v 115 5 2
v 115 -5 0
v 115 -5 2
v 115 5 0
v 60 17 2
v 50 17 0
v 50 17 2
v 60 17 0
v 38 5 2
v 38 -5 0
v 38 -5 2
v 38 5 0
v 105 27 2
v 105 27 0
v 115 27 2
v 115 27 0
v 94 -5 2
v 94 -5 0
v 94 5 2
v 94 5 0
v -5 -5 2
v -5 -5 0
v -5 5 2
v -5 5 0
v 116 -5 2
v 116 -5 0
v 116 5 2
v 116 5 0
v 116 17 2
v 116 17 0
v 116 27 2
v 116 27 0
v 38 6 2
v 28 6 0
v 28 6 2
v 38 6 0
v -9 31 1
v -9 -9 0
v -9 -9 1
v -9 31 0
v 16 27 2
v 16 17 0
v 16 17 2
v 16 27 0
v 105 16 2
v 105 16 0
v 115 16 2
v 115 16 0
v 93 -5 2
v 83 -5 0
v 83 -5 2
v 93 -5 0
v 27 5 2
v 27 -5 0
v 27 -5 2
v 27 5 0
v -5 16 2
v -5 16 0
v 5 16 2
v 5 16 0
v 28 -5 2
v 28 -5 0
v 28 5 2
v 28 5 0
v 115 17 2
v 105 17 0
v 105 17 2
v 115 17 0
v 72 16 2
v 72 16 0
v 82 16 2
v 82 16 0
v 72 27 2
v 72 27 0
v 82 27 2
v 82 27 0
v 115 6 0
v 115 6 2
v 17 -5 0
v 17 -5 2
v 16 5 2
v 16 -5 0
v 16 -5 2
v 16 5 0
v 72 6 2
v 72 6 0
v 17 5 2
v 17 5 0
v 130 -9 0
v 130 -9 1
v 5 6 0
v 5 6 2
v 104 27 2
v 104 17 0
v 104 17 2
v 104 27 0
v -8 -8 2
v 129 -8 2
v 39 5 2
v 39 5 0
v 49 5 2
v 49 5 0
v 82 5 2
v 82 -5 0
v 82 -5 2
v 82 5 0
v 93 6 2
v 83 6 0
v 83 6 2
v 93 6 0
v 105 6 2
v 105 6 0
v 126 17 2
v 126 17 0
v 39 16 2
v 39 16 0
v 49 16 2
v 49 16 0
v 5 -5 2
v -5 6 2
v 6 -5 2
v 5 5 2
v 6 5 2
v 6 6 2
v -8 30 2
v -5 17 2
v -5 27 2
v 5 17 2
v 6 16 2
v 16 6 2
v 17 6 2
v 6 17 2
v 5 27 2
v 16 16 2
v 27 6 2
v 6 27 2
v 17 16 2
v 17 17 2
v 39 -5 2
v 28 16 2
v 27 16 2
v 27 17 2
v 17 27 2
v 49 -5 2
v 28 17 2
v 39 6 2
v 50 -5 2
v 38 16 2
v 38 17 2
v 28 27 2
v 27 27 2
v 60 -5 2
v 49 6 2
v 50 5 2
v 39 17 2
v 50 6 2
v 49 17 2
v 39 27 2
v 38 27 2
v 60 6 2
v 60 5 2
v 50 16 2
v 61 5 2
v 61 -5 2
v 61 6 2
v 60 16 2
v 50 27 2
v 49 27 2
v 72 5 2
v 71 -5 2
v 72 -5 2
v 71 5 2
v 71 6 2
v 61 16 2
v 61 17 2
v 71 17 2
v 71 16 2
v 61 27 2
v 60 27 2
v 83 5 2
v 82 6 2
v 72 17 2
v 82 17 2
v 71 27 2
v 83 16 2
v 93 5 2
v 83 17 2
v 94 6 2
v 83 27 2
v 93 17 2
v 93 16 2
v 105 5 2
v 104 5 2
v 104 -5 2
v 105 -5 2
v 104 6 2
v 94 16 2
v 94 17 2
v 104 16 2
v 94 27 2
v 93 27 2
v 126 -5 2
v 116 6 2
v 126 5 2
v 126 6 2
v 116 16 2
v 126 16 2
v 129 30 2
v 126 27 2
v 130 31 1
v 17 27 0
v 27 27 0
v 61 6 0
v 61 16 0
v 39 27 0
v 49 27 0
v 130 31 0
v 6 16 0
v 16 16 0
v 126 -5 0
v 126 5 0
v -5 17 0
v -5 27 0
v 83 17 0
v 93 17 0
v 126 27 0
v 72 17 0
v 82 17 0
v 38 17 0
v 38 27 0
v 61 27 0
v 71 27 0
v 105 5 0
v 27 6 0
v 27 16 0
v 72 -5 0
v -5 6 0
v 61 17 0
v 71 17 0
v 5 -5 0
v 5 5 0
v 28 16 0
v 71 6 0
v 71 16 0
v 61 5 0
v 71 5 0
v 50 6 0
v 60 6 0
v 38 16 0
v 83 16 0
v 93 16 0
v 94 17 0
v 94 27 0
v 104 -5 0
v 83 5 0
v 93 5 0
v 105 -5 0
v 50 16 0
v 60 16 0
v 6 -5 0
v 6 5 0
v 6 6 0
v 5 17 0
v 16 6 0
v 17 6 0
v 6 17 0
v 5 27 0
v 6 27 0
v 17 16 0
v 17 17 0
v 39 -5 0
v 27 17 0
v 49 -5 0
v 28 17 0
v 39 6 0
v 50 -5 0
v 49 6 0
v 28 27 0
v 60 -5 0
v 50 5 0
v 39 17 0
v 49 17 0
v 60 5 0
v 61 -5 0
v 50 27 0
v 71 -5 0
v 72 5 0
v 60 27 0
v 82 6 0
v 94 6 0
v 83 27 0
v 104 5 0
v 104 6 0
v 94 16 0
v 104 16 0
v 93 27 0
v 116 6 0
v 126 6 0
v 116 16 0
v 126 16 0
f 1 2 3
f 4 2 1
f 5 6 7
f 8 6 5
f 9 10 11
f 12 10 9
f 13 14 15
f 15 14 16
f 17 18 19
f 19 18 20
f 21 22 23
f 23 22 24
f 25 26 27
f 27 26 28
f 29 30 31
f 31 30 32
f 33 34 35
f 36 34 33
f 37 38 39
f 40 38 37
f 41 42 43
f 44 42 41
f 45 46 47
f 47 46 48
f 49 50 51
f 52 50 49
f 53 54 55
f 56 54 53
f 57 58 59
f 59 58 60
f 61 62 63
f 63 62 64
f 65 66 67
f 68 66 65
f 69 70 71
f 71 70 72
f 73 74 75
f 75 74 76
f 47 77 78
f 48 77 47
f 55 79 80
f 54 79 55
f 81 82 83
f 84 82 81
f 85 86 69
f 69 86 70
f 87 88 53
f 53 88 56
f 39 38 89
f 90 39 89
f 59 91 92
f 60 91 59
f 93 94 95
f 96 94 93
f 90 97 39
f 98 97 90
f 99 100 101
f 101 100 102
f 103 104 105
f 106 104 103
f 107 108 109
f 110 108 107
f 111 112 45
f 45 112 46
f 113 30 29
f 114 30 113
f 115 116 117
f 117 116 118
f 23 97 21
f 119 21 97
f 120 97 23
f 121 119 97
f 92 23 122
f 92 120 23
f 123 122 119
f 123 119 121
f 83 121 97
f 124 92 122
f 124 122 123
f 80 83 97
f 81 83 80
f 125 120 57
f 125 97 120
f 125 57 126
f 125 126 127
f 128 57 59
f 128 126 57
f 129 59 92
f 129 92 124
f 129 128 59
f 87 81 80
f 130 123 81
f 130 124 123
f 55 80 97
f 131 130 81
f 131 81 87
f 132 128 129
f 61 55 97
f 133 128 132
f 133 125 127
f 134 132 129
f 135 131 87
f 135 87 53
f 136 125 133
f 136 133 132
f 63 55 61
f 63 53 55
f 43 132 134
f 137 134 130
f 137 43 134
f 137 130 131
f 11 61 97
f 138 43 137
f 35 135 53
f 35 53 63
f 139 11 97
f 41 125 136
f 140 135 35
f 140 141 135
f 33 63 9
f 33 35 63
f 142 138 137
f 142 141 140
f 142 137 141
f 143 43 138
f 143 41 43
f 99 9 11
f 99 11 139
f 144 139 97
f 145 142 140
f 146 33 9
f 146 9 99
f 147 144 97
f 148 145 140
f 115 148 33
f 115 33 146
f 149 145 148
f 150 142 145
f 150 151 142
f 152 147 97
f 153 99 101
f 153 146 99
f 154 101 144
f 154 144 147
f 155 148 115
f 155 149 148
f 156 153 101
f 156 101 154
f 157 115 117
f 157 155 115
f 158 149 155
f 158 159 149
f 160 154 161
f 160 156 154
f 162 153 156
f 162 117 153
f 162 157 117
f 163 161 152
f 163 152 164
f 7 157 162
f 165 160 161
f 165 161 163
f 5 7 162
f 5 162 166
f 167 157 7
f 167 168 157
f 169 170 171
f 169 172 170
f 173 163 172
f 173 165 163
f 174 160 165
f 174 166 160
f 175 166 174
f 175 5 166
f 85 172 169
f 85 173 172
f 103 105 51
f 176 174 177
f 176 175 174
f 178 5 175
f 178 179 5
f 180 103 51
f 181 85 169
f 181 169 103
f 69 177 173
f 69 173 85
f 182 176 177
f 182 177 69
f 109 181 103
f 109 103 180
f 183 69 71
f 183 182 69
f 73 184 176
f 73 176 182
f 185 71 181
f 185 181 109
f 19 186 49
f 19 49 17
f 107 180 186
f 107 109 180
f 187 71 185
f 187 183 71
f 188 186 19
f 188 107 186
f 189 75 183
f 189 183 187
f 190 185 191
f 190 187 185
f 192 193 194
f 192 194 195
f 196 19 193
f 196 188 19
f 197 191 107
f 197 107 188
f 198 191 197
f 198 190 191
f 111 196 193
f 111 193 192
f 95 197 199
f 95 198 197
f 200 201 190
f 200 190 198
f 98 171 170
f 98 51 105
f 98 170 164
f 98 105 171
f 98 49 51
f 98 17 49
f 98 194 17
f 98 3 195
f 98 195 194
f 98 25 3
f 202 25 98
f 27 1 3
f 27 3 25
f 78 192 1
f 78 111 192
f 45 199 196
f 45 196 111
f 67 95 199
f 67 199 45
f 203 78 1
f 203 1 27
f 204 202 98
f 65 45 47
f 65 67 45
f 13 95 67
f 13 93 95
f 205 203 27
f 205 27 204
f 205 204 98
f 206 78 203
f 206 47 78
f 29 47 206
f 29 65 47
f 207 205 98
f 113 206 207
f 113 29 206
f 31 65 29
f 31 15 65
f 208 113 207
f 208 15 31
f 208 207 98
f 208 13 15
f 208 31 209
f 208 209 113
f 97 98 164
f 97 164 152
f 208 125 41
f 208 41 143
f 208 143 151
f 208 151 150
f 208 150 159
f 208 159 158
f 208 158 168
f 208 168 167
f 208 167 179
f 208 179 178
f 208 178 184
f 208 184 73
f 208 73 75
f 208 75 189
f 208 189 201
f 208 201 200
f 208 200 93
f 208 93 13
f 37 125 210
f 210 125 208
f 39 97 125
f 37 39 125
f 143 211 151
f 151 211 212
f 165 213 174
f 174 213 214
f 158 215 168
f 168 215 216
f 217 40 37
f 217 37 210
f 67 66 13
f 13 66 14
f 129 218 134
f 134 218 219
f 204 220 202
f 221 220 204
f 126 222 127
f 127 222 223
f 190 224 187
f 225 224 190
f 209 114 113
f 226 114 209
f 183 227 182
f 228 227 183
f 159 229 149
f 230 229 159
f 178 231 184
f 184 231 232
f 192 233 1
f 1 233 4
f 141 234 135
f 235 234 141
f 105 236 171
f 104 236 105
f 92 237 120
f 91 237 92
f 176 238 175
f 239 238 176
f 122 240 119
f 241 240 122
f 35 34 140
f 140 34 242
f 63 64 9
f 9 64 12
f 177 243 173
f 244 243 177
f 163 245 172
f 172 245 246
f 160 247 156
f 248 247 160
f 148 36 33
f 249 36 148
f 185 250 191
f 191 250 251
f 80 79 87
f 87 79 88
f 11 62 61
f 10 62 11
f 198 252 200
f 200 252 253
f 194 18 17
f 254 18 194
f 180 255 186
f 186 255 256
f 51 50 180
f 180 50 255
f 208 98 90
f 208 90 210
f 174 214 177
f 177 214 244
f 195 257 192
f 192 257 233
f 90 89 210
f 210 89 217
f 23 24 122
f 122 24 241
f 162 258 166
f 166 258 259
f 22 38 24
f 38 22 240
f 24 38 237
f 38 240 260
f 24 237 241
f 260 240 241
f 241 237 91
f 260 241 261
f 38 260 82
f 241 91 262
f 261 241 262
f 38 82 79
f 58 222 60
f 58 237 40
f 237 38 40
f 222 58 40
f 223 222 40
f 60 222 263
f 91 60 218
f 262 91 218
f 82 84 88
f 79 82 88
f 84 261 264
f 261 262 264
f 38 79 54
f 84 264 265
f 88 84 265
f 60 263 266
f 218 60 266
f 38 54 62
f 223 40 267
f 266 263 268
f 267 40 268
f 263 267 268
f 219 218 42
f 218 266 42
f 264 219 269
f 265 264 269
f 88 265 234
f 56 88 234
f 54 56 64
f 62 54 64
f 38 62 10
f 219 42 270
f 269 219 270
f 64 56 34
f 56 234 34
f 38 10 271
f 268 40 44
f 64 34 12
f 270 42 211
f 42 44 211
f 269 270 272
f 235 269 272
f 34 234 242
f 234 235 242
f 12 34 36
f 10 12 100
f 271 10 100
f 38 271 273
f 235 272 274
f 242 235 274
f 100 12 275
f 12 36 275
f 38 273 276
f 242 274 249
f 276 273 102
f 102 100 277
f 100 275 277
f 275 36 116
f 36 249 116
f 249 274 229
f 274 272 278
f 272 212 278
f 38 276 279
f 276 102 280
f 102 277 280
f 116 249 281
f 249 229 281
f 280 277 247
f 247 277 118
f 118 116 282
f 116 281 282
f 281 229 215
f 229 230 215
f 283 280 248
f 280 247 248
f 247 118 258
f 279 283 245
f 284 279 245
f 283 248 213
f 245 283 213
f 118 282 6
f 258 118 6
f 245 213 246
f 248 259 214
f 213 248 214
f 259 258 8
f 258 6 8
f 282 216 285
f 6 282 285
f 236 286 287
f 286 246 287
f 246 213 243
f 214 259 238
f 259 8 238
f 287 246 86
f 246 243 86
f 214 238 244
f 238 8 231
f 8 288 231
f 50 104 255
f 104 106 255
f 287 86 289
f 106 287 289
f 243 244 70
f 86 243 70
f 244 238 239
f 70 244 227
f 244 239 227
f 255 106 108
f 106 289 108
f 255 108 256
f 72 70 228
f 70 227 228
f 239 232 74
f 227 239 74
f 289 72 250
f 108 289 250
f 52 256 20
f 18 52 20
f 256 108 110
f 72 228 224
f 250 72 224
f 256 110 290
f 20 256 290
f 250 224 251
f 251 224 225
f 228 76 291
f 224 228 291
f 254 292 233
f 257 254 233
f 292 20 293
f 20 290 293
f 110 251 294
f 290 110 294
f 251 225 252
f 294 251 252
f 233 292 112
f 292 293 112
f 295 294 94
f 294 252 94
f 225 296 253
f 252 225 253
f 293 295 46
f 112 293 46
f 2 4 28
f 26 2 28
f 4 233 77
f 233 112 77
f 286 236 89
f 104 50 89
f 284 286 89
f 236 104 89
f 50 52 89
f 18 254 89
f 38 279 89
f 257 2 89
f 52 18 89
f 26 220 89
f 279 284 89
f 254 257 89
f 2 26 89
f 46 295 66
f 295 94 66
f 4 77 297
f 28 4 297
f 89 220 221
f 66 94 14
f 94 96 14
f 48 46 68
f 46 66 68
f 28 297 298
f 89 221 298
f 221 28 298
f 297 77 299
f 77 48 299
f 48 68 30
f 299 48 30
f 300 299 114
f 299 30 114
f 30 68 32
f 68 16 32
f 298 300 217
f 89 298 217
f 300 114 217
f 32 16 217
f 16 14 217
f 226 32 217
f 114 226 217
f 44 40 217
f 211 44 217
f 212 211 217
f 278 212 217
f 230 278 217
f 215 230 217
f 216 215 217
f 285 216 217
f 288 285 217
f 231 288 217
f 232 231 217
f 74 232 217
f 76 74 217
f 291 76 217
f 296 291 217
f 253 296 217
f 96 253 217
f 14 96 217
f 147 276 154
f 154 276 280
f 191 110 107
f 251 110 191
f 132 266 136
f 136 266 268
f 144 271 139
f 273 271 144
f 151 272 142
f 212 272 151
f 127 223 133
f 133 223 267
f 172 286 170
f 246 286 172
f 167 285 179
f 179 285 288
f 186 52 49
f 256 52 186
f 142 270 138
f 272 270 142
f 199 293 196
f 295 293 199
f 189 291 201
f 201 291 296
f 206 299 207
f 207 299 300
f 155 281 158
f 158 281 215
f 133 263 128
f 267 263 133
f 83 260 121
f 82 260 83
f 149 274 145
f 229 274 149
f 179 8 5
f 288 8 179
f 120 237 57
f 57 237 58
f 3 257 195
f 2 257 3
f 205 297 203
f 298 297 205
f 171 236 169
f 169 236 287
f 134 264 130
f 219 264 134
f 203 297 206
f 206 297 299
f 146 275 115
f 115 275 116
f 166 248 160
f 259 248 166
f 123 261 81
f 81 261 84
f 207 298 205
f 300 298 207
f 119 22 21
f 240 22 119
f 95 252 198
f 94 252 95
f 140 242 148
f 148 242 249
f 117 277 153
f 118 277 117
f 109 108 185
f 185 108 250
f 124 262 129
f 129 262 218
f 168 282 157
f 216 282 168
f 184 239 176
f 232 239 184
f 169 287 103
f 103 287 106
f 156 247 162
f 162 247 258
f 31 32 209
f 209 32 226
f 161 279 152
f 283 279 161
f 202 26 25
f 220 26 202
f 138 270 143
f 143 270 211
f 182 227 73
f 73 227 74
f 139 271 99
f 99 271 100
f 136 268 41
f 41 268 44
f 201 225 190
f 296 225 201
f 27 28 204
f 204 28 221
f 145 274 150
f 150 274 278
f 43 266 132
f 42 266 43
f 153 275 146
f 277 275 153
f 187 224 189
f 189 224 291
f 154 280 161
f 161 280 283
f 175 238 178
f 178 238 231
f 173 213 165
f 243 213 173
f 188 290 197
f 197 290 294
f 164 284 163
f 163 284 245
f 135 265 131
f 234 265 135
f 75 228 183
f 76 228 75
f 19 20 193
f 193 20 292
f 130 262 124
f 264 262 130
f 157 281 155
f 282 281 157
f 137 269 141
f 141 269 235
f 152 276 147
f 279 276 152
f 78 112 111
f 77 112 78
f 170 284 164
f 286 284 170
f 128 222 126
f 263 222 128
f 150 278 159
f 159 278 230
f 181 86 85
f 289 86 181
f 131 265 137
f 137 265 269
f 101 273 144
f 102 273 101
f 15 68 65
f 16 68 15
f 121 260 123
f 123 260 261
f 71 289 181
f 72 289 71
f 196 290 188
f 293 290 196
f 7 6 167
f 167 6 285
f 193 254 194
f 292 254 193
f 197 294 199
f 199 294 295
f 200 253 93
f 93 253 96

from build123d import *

# Parameters (mm, degrees)
F0_W     = 139
F0_H     = 40
F0_W_2   = 10
F0_H_2   = 10
F1_DEPTH = 2
F2_SIZE  = 1


with BuildPart() as f1:
    # F0 (on Top) → F1 (new body)
    with BuildSketch(Plane.XY):
        with Locations((60.5, 11)):
            Rectangle(F0_W, F0_H)
        Rectangle(F0_W_2, F0_H_2, mode=Mode.SUBTRACT)
        with Locations((11, 0)):
            Rectangle(F0_W_2, F0_H_2, mode=Mode.SUBTRACT)
        with Locations((22, 0)):
            Rectangle(F0_W_2, F0_H_2, mode=Mode.SUBTRACT)
        with Locations((33, 0)):
            Rectangle(F0_W_2, F0_H_2, mode=Mode.SUBTRACT)
        with Locations((44, 0)):
            Rectangle(F0_W_2, F0_H_2, mode=Mode.SUBTRACT)
        with Locations((55, 0)):
            Rectangle(F0_W_2, F0_H_2, mode=Mode.SUBTRACT)
        with Locations((66, 0)):
            Rectangle(F0_W_2, F0_H_2, mode=Mode.SUBTRACT)
        with Locations((77, 0)):
            Rectangle(F0_W_2, F0_H_2, mode=Mode.SUBTRACT)
        with Locations((88, 0)):
            Rectangle(F0_W_2, F0_H_2, mode=Mode.SUBTRACT)
        with Locations((99, 0)):
            Rectangle(F0_W_2, F0_H_2, mode=Mode.SUBTRACT)
        with Locations((110, 0)):
            Rectangle(F0_W_2, F0_H_2, mode=Mode.SUBTRACT)
        with Locations((121, 0)):
            Rectangle(F0_W_2, F0_H_2, mode=Mode.SUBTRACT)
        with Locations((0, 11)):
            Rectangle(F0_W_2, F0_H_2, mode=Mode.SUBTRACT)
        with Locations((11, 11)):
            Rectangle(F0_W_2, F0_H_2, mode=Mode.SUBTRACT)
        with Locations((22, 11)):
            Rectangle(F0_W_2, F0_H_2, mode=Mode.SUBTRACT)
        with Locations((33, 11)):
            Rectangle(F0_W_2, F0_H_2, mode=Mode.SUBTRACT)
        with Locations((44, 11)):
            Rectangle(F0_W_2, F0_H_2, mode=Mode.SUBTRACT)
        with Locations((55, 11)):
            Rectangle(F0_W_2, F0_H_2, mode=Mode.SUBTRACT)
        with Locations((0, 22)):
            Rectangle(F0_W_2, F0_H_2, mode=Mode.SUBTRACT)
        with Locations((11, 22)):
            Rectangle(F0_W_2, F0_H_2, mode=Mode.SUBTRACT)
        with Locations((22, 22)):
            Rectangle(F0_W_2, F0_H_2, mode=Mode.SUBTRACT)
        with Locations((33, 22)):
            Rectangle(F0_W_2, F0_H_2, mode=Mode.SUBTRACT)
        with Locations((44, 22)):
            Rectangle(F0_W_2, F0_H_2, mode=Mode.SUBTRACT)
        with Locations((55, 22)):
            Rectangle(F0_W_2, F0_H_2, mode=Mode.SUBTRACT)
        with Locations((66, 11)):
            Rectangle(F0_W_2, F0_H_2, mode=Mode.SUBTRACT)
        with Locations((77, 11)):
            Rectangle(F0_W_2, F0_H_2, mode=Mode.SUBTRACT)
        with Locations((88, 11)):
            Rectangle(F0_W_2, F0_H_2, mode=Mode.SUBTRACT)
        with Locations((99, 11)):
            Rectangle(F0_W_2, F0_H_2, mode=Mode.SUBTRACT)
        with Locations((110, 11)):
            Rectangle(F0_W_2, F0_H_2, mode=Mode.SUBTRACT)
        with Locations((121, 11)):
            Rectangle(F0_W_2, F0_H_2, mode=Mode.SUBTRACT)
        with Locations((66, 22)):
            Rectangle(F0_W_2, F0_H_2, mode=Mode.SUBTRACT)
        with Locations((77, 22)):
            Rectangle(F0_W_2, F0_H_2, mode=Mode.SUBTRACT)
        with Locations((88, 22)):
            Rectangle(F0_W_2, F0_H_2, mode=Mode.SUBTRACT)
        with Locations((99, 22)):
            Rectangle(F0_W_2, F0_H_2, mode=Mode.SUBTRACT)
        with Locations((110, 22)):
            Rectangle(F0_W_2, F0_H_2, mode=Mode.SUBTRACT)
        with Locations((121, 22)):
            Rectangle(F0_W_2, F0_H_2, mode=Mode.SUBTRACT)
    extrude(amount=F1_DEPTH)

    # F2
    f2_edges = [f1.edges().sort_by_distance(p)[0] for p in [
        (60.5, -9, 2),
        (-9, 11, 2),
        (60.5, 31, 2),
        (130, 11, 2),
    ]]
    chamfer(f2_edges, length=F2_SIZE)


solid = f1.part
